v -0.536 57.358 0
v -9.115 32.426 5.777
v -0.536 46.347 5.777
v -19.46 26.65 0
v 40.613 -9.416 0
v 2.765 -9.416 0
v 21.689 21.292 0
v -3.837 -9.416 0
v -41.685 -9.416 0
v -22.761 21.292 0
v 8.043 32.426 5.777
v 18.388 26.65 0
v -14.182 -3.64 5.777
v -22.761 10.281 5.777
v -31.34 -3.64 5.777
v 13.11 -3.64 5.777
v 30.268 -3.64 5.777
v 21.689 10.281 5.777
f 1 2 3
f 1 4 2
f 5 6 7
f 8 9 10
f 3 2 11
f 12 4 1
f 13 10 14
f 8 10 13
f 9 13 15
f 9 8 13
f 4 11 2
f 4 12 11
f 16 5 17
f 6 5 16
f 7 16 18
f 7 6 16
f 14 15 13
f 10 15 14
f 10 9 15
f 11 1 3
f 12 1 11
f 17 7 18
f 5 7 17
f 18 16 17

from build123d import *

# Parameters (mm, degrees)
F1_DEPTH      = 5.776533857
F2_T1_DEPTH   = 83.6424487366
F2_T3_DEPTH   = 81.5562575155
F2_T5_DEPTH   = 81.5562575155
F2_2_T1_DEPTH = 83.6424487366
F2_2_T3_DEPTH = 81.5562575155
F2_2_T5_DEPTH = 81.5562575155
F2_3_T1_DEPTH = 81.5562575155
F2_3_T3_DEPTH = 83.6424487366
F2_3_T5_DEPTH = 81.5562575155


# Not quite as in the source:
# - a fillet or chamfer that OpenCascade refuses, or shapes differently, is made with other operations: its cross-section is extruded or revolved along the edge and cut away or added


with BuildPart() as f1:
    # F0 (on Top) → F1 (new body)
    with BuildSketch(Plane.XY):
        Polygon((21.688936314, 24.8060692102), (-0.536063686, -11.25972718), (43.913936314, -11.25972718), align=None)
    extrude(amount=F1_DEPTH)

    # F2: chamfer of 7.62 on 3 edges, made by hand

    # F2_s2 → F2_t1 (cut)
    with BuildSketch(Plane.YZ.offset(-20.1322880543)):
        Polygon((-11.25972718, -1.843466143), (-3.63972718, 5.776533857), (-11.25972718, 5.776533857), align=None)
    extrude(amount=F2_T1_DEPTH, mode=Mode.SUBTRACT)

    # F2_s4 → F2_t3 (cut)
    with BuildSketch(Plane(origin=(27.3959125979, -44.4569361385, 0), x_dir=(0, 0, 1), z_dir=(-0.5246223284, 0.8513350766, 0))):
        Polygon((-1.843466143, 31.478370044), (5.776533857, 23.858370044), (5.776533857, 31.478370044), align=None)
    extrude(amount=F2_T3_DEPTH, mode=Mode.SUBTRACT)

    # F2_s6 → F2_t5 (cut)
    with BuildSketch(Plane(origin=(27.3291517213, 44.3485993924, 0), x_dir=(0, 0, 1), z_dir=(-0.5246223284, -0.8513350766, 0))):
        Polygon((-1.843466143, -5.4507344708), (5.776533857, -13.0707344708), (5.776533857, -5.4507344708), align=None)
    extrude(amount=F2_T5_DEPTH, mode=Mode.SUBTRACT)


with BuildPart() as f1b:
    # F0 (on Top) → F1, piece 2 (new body)
    with BuildSketch(Plane.XY):
        Polygon((-22.761063686, 24.8060692102), (-44.986063686, -11.25972718), (-0.536063686, -11.25972718), align=None)
    extrude(amount=F1_DEPTH)

    # F2#2: chamfer of 7.62 on 3 edges, made by hand

    # F2_2_s2 → F2_2_t1 (cut)
    with BuildSketch(Plane.YZ.offset(-64.5822880543)):
        Polygon((-11.25972718, -1.843466143), (-3.63972718, 5.776533857), (-11.25972718, 5.776533857), align=None)
    extrude(amount=F2_2_T1_DEPTH, mode=Mode.SUBTRACT)

    # F2_2_s4 → F2_2_t3 (cut)
    with BuildSketch(Plane(origin=(15.1620018871, -24.6042597493, 0), x_dir=(0, 0, 1), z_dir=(-0.5246223284, 0.8513350766, 0))):
        Polygon((-1.843466143, -6.3634741091), (5.776533857, -13.9834741091), (5.776533857, -6.3634741091), align=None)
    extrude(amount=F2_2_T3_DEPTH, mode=Mode.SUBTRACT)

    # F2_2_s6 → F2_2_t5 (cut)
    with BuildSketch(Plane(origin=(15.0952410105, 24.4959230032, 0), x_dir=(0, 0, 1), z_dir=(-0.5246223284, -0.8513350766, 0))):
        Polygon((-1.843466143, 32.3911096823), (5.776533857, 24.7711096823), (5.776533857, 32.3911096823), align=None)
    extrude(amount=F2_2_T5_DEPTH, mode=Mode.SUBTRACT)


with BuildPart() as f1c:
    # F0 (on Top) → F1, piece 3 (new body)
    with BuildSketch(Plane.XY):
        Polygon((-0.536063686, 60.8718656003), (-22.761063686, 24.8060692102), (21.688936314, 24.8060692102), align=None)
    extrude(amount=F1_DEPTH)

    # F2#3: chamfer of 7.62 on 3 edges, made by hand

    # F2_3_s2 → F2_3_t1 (cut)
    with BuildSketch(Plane(origin=(37.3202410105, 60.5617193934, 0), x_dir=(0, 0, 1), z_dir=(-0.5246223284, -0.8513350766, 0))):
        Polygon((-1.843466143, 32.3911096823), (5.776533857, 24.7711096823), (5.776533857, 32.3911096823), align=None)
    extrude(amount=F2_3_T1_DEPTH, mode=Mode.SUBTRACT)

    # F2_3_s4 → F2_3_t3 (cut)
    with BuildSketch(Plane.YZ.offset(-42.3572880543)):
        Polygon((24.8060692102, -1.843466143), (32.4260692102, 5.776533857), (24.8060692102, 5.776533857), align=None)
    extrude(amount=F2_3_T3_DEPTH, mode=Mode.SUBTRACT)

    # F2_3_s6 → F2_3_t5 (cut)
    with BuildSketch(Plane(origin=(5.1709125979, -8.3911397483, 0), x_dir=(0, 0, 1), z_dir=(-0.5246223284, 0.8513350766, 0))):
        Polygon((-1.843466143, 31.478370044), (5.776533857, 23.858370044), (5.776533857, 31.478370044), align=None)
    extrude(amount=F2_3_T5_DEPTH, mode=Mode.SUBTRACT)


solid = Compound([f1.part, f1b.part, f1c.part])
